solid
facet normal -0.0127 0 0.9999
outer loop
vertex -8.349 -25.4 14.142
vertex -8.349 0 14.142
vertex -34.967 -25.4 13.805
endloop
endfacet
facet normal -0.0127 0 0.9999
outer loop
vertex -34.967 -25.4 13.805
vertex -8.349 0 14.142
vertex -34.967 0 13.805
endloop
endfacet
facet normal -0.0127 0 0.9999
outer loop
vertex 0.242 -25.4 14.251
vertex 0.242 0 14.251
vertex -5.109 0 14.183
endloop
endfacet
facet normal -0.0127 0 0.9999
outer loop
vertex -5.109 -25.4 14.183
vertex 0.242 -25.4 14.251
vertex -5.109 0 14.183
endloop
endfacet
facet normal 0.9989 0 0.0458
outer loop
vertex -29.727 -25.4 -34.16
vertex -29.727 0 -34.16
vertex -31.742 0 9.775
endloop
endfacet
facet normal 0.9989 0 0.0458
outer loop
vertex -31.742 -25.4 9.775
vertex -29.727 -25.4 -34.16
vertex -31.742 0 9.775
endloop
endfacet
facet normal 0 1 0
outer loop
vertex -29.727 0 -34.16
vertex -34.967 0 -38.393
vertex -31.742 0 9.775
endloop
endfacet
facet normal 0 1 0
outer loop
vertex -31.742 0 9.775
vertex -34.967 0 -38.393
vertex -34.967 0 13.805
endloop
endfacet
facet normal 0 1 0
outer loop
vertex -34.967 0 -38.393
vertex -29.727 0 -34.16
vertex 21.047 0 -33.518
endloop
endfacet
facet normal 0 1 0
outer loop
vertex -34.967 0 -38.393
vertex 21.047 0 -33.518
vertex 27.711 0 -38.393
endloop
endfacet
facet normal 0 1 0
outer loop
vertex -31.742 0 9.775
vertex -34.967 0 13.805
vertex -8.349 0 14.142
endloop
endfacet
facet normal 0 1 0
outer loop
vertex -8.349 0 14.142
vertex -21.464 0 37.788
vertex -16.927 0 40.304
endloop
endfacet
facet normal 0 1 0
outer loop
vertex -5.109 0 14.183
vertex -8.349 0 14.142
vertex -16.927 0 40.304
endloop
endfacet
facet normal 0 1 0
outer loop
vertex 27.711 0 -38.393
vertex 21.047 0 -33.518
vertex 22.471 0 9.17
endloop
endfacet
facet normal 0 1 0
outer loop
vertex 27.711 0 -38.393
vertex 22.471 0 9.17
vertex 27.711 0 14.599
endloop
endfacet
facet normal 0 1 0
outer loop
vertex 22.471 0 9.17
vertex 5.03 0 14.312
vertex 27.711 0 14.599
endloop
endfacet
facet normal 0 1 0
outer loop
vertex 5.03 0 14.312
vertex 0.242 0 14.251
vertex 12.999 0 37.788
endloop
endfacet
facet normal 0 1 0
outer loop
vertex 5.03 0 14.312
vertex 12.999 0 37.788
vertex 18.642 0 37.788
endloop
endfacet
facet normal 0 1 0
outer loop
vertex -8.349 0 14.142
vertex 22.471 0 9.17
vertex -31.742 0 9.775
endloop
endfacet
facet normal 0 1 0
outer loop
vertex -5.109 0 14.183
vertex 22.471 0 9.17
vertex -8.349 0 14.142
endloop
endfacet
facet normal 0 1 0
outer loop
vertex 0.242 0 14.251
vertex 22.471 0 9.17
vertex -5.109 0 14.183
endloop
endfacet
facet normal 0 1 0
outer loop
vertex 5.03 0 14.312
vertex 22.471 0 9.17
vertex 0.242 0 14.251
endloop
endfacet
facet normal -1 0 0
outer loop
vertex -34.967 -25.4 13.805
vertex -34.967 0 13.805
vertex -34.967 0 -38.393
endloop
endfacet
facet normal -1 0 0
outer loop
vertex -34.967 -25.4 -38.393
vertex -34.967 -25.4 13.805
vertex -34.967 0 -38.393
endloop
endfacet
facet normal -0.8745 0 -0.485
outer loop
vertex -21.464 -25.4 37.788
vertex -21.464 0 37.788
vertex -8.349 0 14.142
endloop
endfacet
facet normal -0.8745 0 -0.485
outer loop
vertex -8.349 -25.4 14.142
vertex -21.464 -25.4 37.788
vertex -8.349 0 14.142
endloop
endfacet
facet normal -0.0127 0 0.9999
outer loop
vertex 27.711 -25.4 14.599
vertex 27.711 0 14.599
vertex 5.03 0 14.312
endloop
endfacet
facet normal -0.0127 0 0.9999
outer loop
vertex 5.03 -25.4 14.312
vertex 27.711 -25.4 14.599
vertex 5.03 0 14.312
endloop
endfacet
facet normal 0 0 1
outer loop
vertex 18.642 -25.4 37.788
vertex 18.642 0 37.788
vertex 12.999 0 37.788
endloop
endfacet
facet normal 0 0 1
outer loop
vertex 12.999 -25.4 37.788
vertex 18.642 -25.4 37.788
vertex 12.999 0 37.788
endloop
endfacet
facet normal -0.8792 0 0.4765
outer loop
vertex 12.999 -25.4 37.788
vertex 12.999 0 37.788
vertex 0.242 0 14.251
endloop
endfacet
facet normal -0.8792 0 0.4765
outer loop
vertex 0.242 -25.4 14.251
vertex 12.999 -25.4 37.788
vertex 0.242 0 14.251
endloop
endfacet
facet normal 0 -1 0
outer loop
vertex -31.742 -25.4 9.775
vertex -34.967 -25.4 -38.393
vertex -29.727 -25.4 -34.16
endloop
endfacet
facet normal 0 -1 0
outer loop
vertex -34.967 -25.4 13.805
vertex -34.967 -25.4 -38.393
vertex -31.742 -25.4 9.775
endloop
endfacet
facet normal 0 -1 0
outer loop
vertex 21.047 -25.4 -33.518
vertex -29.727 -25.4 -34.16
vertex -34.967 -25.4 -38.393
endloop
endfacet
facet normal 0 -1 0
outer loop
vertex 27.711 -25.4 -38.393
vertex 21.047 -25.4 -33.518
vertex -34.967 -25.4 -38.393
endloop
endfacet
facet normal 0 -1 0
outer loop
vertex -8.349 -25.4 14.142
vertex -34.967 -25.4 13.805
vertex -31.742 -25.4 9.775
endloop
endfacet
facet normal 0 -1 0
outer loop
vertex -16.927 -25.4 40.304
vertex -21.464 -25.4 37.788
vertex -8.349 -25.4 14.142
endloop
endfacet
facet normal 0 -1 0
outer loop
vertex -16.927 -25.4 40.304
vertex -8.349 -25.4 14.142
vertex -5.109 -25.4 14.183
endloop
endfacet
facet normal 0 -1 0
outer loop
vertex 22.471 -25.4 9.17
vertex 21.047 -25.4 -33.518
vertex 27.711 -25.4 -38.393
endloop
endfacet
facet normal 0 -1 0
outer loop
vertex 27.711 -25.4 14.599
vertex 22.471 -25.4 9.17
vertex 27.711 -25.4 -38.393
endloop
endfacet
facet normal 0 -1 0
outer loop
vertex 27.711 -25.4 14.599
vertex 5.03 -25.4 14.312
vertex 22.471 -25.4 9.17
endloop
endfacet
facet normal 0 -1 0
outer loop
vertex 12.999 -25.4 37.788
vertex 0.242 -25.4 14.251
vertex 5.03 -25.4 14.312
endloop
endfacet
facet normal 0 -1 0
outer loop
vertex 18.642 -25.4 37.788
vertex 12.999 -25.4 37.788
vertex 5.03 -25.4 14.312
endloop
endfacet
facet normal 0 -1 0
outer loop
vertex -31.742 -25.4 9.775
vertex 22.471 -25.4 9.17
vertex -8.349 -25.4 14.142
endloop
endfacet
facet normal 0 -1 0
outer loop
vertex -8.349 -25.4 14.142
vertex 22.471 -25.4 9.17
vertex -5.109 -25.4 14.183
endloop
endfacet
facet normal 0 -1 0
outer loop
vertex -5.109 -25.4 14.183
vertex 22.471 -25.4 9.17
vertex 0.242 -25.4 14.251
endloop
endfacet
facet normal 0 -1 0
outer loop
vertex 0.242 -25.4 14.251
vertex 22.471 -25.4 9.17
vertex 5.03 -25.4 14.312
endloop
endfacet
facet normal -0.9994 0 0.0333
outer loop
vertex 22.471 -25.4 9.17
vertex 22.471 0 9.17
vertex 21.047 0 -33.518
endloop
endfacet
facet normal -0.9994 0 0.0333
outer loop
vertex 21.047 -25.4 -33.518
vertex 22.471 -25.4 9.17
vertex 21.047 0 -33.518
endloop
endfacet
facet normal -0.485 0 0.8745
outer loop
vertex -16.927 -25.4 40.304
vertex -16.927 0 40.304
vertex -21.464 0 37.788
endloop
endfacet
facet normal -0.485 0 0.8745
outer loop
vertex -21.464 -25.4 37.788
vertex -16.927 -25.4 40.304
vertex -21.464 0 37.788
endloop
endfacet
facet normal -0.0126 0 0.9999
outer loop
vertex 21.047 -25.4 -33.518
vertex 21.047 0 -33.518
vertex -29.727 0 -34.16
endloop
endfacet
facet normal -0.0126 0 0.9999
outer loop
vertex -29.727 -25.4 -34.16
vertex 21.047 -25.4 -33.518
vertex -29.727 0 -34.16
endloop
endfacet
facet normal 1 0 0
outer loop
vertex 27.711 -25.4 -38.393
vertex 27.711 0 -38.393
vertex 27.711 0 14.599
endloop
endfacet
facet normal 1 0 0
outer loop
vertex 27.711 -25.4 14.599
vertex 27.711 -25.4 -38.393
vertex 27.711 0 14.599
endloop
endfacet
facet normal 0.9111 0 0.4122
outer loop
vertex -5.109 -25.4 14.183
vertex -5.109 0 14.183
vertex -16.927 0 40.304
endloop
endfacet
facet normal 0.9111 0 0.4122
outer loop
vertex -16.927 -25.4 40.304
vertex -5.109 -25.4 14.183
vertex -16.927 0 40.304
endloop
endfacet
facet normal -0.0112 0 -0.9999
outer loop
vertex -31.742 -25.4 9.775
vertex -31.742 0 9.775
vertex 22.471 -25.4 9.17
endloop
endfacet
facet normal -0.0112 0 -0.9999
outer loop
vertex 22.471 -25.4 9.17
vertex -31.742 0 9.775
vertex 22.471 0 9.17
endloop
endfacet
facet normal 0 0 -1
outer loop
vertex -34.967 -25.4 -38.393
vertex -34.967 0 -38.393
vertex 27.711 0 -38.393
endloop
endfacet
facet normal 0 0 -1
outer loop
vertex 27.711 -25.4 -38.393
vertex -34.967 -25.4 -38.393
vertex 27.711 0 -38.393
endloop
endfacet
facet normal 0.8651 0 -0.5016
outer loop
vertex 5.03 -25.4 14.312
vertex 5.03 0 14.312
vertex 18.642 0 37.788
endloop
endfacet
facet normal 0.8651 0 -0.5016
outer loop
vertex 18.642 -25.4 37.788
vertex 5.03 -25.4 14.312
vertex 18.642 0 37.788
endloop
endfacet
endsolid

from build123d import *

# Parameters (mm, degrees)
F1_DEPTH = 25.4
F3_DEPTH = 25.4


with BuildPart() as f1:
    # F0 (on Front) → F1 (new body)
    with BuildSketch(Plane.XZ):
        Polygon((27.711272, 14.598642), (-34.966588, 13.805252), (-34.966588, -38.392708), (27.711272, -38.392708), align=None)
        Polygon((-29.726638, -34.160443), (-31.742003, 9.774522), (22.471322, 9.169912), (21.04733, -33.517734), align=None, mode=Mode.SUBTRACT)
    extrude(amount=F1_DEPTH)

    # F2 (on Front) → F3 (join)
    with BuildSketch(Plane.XZ):
        Polygon((-21.46364, 37.788097), (-8.162229, 13.805252), (-4.937645, 13.805252), (-16.926625, 40.304425), align=None)
        Polygon((12.999105, 37.788097), (0, 13.805252), (4.736108, 13.805252), (18.642128, 37.788097), align=None)
    extrude(amount=F3_DEPTH)


solid = f1.part
